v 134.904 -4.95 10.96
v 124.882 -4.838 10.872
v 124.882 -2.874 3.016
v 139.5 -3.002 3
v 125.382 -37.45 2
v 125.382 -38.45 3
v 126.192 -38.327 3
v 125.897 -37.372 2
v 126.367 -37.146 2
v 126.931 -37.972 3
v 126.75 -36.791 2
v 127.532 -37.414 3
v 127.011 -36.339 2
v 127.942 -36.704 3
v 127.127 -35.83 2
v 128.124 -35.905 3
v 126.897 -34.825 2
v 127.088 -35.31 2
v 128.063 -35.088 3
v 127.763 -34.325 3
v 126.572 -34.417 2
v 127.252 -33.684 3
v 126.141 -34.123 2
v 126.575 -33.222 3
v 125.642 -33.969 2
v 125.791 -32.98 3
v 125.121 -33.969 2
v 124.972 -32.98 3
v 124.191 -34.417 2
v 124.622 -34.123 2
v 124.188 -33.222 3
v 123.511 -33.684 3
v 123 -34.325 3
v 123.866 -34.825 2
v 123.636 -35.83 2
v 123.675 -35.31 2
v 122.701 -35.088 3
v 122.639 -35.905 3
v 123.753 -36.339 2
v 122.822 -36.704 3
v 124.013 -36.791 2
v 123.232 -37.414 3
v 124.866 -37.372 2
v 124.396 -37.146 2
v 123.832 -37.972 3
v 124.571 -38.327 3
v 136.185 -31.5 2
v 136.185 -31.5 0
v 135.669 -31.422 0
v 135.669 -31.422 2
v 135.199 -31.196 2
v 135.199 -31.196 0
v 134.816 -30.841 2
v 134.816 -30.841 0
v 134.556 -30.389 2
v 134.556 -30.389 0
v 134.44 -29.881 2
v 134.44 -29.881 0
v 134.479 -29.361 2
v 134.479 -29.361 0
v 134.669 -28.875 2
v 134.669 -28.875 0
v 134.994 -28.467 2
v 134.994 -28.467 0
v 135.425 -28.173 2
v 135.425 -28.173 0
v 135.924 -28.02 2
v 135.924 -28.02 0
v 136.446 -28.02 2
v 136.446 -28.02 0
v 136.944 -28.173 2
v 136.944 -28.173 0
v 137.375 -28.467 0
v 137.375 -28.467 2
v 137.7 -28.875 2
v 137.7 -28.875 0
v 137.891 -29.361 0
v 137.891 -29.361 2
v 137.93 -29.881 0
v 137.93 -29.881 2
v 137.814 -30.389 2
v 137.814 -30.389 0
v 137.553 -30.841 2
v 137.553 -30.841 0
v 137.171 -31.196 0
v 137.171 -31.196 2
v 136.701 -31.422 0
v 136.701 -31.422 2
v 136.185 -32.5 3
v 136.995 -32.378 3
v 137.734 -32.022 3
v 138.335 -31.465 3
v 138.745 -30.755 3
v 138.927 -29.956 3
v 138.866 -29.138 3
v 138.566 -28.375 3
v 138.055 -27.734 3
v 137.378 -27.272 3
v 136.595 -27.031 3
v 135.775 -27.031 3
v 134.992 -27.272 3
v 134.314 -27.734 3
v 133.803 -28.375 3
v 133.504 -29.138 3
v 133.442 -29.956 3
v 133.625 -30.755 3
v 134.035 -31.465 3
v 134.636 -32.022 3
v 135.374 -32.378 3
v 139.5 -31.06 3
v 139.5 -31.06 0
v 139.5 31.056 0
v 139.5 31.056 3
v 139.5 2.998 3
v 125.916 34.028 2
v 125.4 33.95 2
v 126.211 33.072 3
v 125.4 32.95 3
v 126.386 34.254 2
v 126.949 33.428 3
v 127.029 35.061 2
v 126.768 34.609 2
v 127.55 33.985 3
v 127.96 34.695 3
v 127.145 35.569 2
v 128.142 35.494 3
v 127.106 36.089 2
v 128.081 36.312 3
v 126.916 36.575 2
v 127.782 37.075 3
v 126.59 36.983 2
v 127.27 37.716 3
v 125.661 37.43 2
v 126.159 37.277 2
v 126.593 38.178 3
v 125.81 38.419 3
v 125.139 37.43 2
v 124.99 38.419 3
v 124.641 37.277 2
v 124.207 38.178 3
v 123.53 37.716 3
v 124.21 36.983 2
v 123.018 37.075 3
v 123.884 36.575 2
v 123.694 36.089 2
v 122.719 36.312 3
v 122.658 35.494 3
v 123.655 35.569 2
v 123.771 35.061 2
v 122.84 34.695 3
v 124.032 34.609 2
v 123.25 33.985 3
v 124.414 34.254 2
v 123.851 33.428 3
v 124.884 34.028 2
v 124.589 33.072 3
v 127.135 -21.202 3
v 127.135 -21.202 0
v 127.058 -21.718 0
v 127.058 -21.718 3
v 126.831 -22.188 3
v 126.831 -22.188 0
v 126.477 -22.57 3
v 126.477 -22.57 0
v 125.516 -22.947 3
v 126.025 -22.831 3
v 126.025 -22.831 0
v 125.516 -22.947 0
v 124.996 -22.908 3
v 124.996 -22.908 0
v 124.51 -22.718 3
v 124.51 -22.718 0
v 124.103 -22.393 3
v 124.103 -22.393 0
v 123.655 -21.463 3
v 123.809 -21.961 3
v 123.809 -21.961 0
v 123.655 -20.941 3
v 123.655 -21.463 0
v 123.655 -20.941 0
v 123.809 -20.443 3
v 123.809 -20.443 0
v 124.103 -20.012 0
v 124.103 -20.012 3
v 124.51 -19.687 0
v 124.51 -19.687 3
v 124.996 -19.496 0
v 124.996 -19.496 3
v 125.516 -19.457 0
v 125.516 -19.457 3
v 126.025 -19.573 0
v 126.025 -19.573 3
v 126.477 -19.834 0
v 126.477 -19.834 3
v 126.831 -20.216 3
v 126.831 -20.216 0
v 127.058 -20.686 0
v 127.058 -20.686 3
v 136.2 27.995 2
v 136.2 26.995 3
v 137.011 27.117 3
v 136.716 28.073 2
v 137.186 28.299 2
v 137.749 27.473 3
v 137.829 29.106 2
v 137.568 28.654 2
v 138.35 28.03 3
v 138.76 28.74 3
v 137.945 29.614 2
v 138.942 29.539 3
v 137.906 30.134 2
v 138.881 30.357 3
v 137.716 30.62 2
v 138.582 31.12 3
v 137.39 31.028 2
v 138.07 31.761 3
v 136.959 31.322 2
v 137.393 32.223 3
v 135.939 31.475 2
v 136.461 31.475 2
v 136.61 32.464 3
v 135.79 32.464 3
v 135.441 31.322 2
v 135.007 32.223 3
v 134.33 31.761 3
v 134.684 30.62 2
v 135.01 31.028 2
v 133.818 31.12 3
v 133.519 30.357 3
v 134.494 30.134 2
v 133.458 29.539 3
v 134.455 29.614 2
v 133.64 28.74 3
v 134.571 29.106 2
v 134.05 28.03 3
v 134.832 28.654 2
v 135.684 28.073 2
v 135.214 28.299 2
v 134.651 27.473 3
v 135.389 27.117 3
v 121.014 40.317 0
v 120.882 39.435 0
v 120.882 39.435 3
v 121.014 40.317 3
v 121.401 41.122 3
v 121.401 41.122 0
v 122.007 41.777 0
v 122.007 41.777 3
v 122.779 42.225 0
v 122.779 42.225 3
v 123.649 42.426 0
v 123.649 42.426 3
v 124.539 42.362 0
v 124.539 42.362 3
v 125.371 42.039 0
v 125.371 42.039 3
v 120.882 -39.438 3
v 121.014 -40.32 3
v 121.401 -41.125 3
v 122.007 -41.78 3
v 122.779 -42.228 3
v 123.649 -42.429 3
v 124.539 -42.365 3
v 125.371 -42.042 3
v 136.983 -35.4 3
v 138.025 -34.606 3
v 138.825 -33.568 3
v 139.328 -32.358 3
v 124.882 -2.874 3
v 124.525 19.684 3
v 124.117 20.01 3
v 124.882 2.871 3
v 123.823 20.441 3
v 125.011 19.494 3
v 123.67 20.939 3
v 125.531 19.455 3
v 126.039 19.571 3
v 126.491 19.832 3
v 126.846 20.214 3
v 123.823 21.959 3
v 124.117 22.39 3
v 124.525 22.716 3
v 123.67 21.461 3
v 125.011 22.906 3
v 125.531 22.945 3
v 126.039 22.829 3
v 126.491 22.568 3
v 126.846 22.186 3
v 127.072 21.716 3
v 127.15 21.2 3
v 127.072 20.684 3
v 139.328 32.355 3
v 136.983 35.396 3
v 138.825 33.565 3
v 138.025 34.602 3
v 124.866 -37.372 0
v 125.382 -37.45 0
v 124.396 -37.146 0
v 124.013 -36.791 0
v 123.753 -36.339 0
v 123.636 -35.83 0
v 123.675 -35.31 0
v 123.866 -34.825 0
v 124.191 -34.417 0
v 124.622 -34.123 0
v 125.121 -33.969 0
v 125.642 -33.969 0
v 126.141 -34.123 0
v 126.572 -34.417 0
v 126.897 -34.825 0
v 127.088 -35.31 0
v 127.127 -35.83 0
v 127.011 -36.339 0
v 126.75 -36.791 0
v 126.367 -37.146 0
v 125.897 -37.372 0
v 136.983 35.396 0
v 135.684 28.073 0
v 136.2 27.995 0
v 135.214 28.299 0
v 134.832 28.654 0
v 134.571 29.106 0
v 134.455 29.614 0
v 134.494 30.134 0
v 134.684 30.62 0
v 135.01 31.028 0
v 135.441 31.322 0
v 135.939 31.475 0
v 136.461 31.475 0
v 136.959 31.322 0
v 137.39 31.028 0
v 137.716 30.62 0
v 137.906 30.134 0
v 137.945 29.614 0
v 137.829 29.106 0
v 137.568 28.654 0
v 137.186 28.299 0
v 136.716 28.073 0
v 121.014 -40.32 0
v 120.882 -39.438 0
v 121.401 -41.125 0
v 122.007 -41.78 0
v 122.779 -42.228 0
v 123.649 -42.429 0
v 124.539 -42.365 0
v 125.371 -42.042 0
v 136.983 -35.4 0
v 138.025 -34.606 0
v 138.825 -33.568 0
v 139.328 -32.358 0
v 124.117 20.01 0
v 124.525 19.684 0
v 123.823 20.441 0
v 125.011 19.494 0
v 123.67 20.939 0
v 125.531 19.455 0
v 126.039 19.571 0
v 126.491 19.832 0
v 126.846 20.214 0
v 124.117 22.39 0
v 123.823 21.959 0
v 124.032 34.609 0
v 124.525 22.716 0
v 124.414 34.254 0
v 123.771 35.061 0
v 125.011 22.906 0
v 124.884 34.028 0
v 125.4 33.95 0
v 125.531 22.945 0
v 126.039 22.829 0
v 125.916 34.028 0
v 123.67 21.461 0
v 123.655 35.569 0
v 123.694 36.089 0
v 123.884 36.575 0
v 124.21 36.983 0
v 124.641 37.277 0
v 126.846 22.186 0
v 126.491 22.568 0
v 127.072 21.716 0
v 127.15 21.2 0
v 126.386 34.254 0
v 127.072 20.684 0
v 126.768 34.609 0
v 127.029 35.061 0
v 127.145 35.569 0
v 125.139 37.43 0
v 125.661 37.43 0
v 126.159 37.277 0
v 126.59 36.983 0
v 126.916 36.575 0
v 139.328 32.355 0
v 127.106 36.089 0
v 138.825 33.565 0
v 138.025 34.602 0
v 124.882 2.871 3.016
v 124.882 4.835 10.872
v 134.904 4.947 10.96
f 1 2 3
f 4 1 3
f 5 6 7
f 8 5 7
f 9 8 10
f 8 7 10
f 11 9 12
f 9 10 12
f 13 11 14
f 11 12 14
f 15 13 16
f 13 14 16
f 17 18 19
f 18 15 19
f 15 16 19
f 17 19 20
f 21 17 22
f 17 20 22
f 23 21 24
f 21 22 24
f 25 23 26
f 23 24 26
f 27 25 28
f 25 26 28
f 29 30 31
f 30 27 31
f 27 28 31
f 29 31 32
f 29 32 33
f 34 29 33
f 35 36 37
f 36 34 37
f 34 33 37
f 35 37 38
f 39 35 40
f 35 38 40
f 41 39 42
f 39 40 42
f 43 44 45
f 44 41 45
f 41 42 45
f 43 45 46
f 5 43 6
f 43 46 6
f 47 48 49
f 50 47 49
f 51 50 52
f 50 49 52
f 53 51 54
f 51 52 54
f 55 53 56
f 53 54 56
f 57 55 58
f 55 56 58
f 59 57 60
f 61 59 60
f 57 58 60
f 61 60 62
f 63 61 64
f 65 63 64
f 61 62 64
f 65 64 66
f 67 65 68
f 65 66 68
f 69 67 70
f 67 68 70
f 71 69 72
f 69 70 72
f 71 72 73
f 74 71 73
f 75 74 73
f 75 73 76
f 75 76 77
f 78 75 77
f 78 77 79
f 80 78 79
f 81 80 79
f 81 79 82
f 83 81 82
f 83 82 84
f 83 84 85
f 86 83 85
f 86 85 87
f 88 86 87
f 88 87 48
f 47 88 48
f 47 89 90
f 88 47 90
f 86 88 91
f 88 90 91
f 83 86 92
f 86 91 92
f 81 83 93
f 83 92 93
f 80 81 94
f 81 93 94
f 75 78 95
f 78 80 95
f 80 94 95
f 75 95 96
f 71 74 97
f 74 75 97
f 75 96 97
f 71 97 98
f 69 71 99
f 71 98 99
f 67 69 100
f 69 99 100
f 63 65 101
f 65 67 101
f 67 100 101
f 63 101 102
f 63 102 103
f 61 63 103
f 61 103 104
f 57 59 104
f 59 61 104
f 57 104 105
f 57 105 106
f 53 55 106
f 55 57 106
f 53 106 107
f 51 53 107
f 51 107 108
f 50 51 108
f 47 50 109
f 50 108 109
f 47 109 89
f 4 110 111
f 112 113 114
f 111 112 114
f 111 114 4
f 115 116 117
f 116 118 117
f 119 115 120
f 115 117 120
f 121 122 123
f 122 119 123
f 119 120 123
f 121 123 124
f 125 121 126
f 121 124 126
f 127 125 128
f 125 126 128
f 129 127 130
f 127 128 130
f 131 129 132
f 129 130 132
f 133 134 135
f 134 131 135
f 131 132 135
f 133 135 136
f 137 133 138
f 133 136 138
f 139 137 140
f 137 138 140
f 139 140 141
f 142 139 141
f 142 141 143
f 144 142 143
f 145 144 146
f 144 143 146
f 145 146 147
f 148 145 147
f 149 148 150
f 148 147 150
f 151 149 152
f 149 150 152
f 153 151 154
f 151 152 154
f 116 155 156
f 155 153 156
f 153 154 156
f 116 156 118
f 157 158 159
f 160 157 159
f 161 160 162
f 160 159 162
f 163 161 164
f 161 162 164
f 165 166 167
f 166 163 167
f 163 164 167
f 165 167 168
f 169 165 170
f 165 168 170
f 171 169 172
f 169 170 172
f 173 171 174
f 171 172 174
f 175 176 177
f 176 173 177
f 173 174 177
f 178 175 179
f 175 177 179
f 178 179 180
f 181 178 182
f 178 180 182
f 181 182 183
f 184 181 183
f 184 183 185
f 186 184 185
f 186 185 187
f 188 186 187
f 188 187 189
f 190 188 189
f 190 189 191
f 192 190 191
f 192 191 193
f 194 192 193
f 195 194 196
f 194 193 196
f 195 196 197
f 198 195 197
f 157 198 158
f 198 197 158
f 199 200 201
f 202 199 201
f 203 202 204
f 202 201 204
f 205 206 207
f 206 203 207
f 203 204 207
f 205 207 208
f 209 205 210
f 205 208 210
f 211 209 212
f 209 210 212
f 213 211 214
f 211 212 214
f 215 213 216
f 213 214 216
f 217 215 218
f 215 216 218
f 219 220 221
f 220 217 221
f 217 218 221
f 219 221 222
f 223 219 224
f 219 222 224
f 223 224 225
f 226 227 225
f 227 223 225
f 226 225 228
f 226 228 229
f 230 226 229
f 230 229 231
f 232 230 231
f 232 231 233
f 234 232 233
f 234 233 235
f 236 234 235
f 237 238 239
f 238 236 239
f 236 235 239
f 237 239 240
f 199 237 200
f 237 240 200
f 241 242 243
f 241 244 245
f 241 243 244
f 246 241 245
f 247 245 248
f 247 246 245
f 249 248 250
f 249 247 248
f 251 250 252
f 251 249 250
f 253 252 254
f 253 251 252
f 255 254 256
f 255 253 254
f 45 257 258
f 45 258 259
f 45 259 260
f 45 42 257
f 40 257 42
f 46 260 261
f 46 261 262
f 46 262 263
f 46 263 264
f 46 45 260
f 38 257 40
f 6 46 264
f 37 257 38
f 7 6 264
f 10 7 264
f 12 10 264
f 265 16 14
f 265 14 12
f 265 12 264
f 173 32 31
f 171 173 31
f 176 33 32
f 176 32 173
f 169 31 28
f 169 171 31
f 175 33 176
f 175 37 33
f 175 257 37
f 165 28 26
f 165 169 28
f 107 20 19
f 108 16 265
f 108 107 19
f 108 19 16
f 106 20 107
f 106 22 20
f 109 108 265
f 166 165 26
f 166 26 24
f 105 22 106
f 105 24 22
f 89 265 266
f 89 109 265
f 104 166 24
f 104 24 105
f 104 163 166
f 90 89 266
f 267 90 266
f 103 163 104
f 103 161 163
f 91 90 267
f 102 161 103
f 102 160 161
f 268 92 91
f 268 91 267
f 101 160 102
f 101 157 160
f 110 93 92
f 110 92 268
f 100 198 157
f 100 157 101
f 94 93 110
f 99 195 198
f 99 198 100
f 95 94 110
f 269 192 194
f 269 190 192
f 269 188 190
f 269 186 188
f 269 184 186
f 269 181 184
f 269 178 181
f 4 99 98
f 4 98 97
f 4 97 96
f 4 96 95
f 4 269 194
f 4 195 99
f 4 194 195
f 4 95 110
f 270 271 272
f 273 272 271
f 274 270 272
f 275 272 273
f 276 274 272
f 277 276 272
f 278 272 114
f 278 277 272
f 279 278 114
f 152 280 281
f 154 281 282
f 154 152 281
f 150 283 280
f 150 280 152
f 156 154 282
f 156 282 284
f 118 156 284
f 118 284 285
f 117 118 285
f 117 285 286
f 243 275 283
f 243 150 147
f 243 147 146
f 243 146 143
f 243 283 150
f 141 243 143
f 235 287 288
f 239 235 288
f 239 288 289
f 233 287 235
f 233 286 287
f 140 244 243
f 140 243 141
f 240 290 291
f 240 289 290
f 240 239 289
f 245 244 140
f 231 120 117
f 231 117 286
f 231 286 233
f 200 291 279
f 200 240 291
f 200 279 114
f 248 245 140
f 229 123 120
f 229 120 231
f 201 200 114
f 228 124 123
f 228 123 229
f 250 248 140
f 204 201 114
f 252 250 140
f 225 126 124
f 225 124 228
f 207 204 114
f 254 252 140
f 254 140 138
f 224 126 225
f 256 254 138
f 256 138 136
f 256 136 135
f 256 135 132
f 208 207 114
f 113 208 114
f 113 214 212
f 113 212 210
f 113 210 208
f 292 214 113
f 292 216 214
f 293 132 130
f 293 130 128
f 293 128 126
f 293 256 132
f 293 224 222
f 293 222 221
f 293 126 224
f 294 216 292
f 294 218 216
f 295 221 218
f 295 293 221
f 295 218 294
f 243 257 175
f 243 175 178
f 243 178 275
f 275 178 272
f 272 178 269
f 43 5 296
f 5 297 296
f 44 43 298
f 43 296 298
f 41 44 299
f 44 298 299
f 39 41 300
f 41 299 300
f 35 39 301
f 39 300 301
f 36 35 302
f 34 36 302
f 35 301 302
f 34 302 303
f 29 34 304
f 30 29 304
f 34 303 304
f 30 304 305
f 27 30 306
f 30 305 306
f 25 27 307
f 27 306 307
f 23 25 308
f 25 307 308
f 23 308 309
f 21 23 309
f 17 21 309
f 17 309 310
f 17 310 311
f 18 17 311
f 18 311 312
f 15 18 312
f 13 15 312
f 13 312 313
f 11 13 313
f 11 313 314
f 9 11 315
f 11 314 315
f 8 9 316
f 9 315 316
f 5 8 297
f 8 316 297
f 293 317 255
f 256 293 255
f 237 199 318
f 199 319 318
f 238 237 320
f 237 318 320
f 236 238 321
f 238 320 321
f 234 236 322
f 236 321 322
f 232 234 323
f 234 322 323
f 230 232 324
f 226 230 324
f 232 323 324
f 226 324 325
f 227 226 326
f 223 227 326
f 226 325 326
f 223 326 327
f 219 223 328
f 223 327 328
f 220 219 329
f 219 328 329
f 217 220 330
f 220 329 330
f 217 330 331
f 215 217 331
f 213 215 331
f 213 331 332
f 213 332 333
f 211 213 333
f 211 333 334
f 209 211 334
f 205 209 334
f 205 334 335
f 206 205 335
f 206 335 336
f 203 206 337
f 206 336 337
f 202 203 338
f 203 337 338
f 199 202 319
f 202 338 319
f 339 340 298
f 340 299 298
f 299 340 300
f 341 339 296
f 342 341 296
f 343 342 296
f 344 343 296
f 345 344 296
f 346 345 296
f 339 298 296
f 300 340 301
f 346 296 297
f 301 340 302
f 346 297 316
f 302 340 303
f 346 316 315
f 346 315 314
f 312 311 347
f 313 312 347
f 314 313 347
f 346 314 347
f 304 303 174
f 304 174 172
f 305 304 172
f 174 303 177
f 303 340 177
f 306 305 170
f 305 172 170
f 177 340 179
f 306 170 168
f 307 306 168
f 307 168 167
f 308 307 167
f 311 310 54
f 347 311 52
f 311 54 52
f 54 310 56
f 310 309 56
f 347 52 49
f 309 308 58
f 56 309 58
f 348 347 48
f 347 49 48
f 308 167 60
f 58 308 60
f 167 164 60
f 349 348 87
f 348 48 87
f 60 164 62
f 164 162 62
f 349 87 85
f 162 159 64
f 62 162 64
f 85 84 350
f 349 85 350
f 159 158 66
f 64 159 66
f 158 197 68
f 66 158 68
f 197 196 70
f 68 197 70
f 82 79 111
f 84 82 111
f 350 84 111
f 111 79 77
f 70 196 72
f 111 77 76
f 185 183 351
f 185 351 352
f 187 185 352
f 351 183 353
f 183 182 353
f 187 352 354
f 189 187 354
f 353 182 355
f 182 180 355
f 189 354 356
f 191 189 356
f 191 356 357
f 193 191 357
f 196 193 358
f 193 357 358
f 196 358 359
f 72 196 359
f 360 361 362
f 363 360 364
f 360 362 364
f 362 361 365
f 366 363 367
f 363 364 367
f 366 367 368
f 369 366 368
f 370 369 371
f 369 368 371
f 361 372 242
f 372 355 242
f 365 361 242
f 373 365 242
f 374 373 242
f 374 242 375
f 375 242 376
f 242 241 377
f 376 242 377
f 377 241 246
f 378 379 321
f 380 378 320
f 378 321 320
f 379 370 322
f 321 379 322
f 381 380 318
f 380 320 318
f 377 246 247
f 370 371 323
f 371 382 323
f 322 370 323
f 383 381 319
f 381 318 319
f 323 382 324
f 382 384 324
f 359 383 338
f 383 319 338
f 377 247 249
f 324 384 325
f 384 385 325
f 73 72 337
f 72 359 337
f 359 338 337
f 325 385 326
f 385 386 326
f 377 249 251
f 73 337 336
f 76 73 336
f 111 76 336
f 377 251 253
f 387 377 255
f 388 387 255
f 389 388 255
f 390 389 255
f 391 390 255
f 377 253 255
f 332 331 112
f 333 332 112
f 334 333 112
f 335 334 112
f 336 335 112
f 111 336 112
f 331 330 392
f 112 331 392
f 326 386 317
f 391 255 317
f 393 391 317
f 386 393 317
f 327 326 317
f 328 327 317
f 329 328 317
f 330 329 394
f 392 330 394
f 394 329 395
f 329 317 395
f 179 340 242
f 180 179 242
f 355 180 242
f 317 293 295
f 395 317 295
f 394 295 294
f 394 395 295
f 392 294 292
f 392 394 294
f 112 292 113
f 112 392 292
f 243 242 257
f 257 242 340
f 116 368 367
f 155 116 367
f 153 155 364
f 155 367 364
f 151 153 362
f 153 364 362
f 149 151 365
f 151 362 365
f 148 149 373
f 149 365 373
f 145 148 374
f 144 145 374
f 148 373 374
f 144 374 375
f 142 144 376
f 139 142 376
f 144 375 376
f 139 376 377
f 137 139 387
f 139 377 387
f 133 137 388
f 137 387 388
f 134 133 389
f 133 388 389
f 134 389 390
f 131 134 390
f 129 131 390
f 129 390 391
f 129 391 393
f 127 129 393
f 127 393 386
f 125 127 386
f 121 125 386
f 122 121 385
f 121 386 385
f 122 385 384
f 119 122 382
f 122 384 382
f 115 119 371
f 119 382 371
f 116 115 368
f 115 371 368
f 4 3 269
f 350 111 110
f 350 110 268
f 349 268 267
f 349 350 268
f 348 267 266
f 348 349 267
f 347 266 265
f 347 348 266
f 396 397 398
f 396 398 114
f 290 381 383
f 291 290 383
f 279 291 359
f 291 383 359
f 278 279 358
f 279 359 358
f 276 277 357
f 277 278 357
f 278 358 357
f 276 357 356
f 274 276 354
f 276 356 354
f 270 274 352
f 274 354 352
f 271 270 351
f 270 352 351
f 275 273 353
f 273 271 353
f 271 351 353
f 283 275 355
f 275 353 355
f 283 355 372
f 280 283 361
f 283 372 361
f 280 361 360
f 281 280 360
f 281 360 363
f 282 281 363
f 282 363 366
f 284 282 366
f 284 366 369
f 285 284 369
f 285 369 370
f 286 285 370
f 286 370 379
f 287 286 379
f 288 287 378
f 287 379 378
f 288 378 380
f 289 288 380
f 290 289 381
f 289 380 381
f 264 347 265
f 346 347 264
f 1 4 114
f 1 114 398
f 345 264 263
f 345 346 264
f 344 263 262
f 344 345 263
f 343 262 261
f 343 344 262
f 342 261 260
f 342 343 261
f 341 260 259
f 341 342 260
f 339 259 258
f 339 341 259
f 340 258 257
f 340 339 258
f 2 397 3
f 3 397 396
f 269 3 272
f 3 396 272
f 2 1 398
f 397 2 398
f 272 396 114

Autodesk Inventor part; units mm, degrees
ref_plane "YZ Plane" through (0, 0, 0) normal (1, 0, 0) x (0, 1, 0)
ref_plane "XZ Plane" through (0, 0, 0) normal (0, 1, 0) x (-1, 0, 0)
sketch "Boceto1" plane through (0, 0, 0) normal (0, 0, 1) x (1, 0, 0)
  line L0 (134.9, 24.045) -> (134.9, 29.745)
  arc A0 (134.9, 24.045) -> (137.5, 24.045) centre (136.2, 24.045) ccw
  line L1 (137.5, 29.745) -> (137.5, 24.045)
  circle A1 centre (136.2, 29.745) radius 1.3 construction
  line L2 (126.9, 35.7) -> (126.9, 21.2)
  line L3 (123.9, 21.2) -> (123.9, 35.7)
  circle A2 centre (125.4, 35.7) radius 1.5 construction
  circle A3 centre (125.4, 21.2) radius 1.5 construction
  line L4 (126.8891, -21.2025) -> (126.8816, -35.7004)
  circle A4 centre (125.3854, -21.2022) radius 1.5037 construction
  line L5 (123.8816, -35.6996) -> (123.8816, -21.2019)
  circle A5 centre (125.3816, -35.6996) radius 1.5 construction
  circle A6 centre (136.1847, -29.7501) radius 1.3 construction
  line L6 (137.4876, -24.0508) -> (137.4847, -29.7508)
  arc A7 (137.4876, -24.0508) -> (134.8876, -24.0494) centre (136.1876, -24.0501) ccw
  line L7 (134.8847, -29.7494) -> (134.8876, -24.0494)
  line L8 (120.8816, 55.9985) -> (120.8816, -0.0015)
  line L9 (139.5, 56.008) -> (139.5, -0.0015)
  line L10 (50.0101, -56.038) -> (139.5, -55.992)
  line L11 (139.5, 56.008) -> (49.9528, 55.962)
  line L12 (136.8302, -30.8785) -> (126.1265, -37.0016) construction
  line L13 (136.9827, -35.3995) -> (125.3713, -42.0418)
  arc A8 (192.3943, -3.7013) -> (191.4002, 0.0347) centre (191.4012, -1.9653) ccw
  line L14 (120.8816, -0.0015) -> (120.8816, -39.4378)
  line L15 (139.5, -0.0015) -> (139.5, -31.0595)
  arc A9 (120.8816, -39.4378) -> (125.3713, -42.0418) centre (123.8816, -39.4378) ccw
  arc A10 (136.9827, -35.3995) -> (139.5, -31.0595) centre (134.5, -31.0595) ccw
  line L16 (139.5, -0.0015) -> (120.8816, -0.0015) construction
  line L17 (136.9827, 35.3964) -> (125.3713, 42.0388)
  arc A11 (125.3713, 42.0388) -> (120.8816, 39.4347) centre (123.8816, 39.4347) ccw
  arc A12 (139.5, 31.0564) -> (136.9827, 35.3964) centre (134.5, 31.0564) ccw
  line L18 (137.2847, -29.7507) -> (137.2876, -24.0507)
  arc A13 (137.2876, -24.0507) -> (135.0876, -24.0495) centre (136.1876, -24.0501) ccw
  line L19 (135.0876, -24.0495) -> (135.0847, -29.7495)
  arc A14 (135.0847, -29.7495) -> (137.2847, -29.7507) centre (136.1847, -29.7501) ccw
  line L20 (126.6816, -35.7003) -> (126.6891, -21.2024)
  arc A15 (126.6891, -21.2024) -> (124.0816, -21.2022) centre (125.3854, -21.2022) ccw
  line L21 (124.0816, -21.2022) -> (124.0816, -35.6996)
  arc A16 (124.0816, -35.6996) -> (126.6816, -35.7003) centre (125.3816, -35.6996) ccw
  arc A17 (135.1, 24.045) -> (137.3, 24.045) centre (136.2, 24.045) ccw
  line L22 (135.1, 24.045) -> (135.1, 29.745)
  arc A18 (137.3, 29.745) -> (135.1, 29.745) centre (136.2, 29.745) ccw
  line L23 (137.3, 29.745) -> (137.3, 24.045)
  line L24 (126.7, 21.2) -> (126.7, 35.7)
  arc A19 (126.7, 35.7) -> (124.1, 35.7) centre (125.4, 35.7) ccw
  line L25 (124.1, 35.7) -> (124.1, 21.2)
  arc A20 (124.1, 21.2) -> (126.7, 21.2) centre (125.4, 21.2) ccw
  circle A21 centre (125.3816, -35.6996) radius 1.75
  circle A22 centre (136.1847, -29.7501) radius 1.75
  circle A23 centre (125.4, 35.7) radius 1.75
  circle A24 centre (136.2, 29.745) radius 1.75
  circle A25 centre (125.4, 21.2) radius 1.75
  circle A26 centre (125.3854, -21.2022) radius 1.75
  point P0 (0, 0)
  point P1 (120.8816, -56.0015)
  point P2 (139.5, -33.9595)
  point P3 (120.8816, -44.6101)
  point P4 (126.7, 34.5285)
  point P5 (124.1, 34.5285)
  point P6 (137.3, 28.3839)
  point P7 (135.1, 28.3839)
  point P8 (124.0816, -34.5281)
  point P9 (126.6823, -34.5287)
  point P10 (135.0854, -28.3885)
  point P11 (137.2854, -28.3896)
  dimension "d0" = 3
  dimension "d1" = 2
  dimension "d2" = 4
  dimension "d3" = 2
  dimension "d4" = 3
  dimension "d5" = 5
  dimension "d8" = 0.2
  dimension "d9" = 0.2
  dimension "d10" = 0.2
  dimension "d11" = 0.2
  dimension "d14" = 3.5
  dimension "d15" = 3.5
  dimension "d16" = 3.5
  dimension "d17" = 3.5
  dimension "d18" = 3.5
  dimension "d19" = 3.5
extrude "Extrusión1" add sketch "Boceto1" along normal blind 3 contours L0 A24 L22 A17 L23 L1 A0 | A24 L23 A18 L22 | A24 L23 A17 L22 | L22 A18 L23 A24 | L2 A25 L24 A23 | A23 L24 A19 L25 | A23 L25 A19 L24 | L24 A25 L25 A23 | L25 A25 L3 A23 | L4 A21 L20 A26 | A21 L21 A16 L20 | L20 A21 L21 A26 | L20 A16 L21 A21 | L21 A21 L5 A26 | L6 A22 L18 A13 L19 L7 A7 | A22 L19 A14 L18 | A22 L19 A13 L18 | L18 A14 L19 A22 | A11 L17 A12 L9 L15 A10 L13 A9 L14 L8
extrude "Extrusión2" [suppressed]
sketch "Boceto2" plane through (0, 0, 3) normal (0, 0, 1) x (1, 0, 0)
  point P0 (0, 0)
  point P1 (125.4, 35.7)
  point P2 (136.2, 29.745)
  point P3 (125.4, 21.2)
  point P4 (136.1847, -29.7501)
  point P5 (125.3854, -21.2022)
  point P6 (125.3816, -35.6996)
hole "Agujero1" at (125.4, 35.7, 3) at (136.2, 29.745, 3) at (136.1847, -29.7501, 3) at (125.3816, -35.6996, 3) direction (0, 0, -1) diameter 3.5 end through all countersink diameter 5.5 countersink angle 90
ref_plane "Plano de trabajo1" through (130.1908, -31.0595, 0) normal (1, 0, 0) x (0, 0, -1)
sketch "Boceto3" plane through (139.5, -31.0595, 0) normal (1, 0, 0) x (0, 0, -1)
  line L0 (-3, 31.0579) -> (-11, 31.0579) construction
  line L1 (-11, 26.0579) -> (-11, 36.0579)
  line L2 (-11, 26.0579) -> (-3, 28.0579)
  line L3 (-11, 36.0579) -> (-3, 34.0579)
  line L4 (0, 0) -> (0, 62.1159)
  line L5 (-3, 28.0579) -> (0, 28.0579)
  line L6 (-3, 34.0579) -> (0, 34.0579)
  line L7 (-3, 0) -> (-3, 28.0579)
  line L8 (-3, 34.0579) -> (-3, 62.1159)
  line L9 (-3, 0) -> (-3, 28.0579)
  line L10 (-3, 34.0579) -> (-3, 62.1159)
  point P0 (0, 31.0595)
  dimension "d27" = 8
  dimension "d28" = 10
  dimension "d29" = 6
extrude "Extrusión3" add sketch "Boceto3" against normal blind 14.618 draft -0.5
sketch "Boceto4" plane through (0, 0, 0) normal (0, 1, 0) x (-1, 0, 0)
  line L0 (-124.882, 10.8724) -> (-124.882, 3.0157) projected
  line L1 (-139.5, 3) -> (-124.882, 3.0157) projected
  line L2 (-139.5, 11) -> (-139.5, 3) projected
  line L3 (-139.5, 11) -> (-124.882, 10.8724) projected
  line L4 (-139.5, 3) -> (-134.9044, 10.9599)
  point P0 (0, 0)
  dimension "d32" = 30
extrude "Extrusión4" cut sketch "Boceto4" along normal through all both and the other way through all contours L4 L2 L3
properties part number "AcopleCamara-part1"
